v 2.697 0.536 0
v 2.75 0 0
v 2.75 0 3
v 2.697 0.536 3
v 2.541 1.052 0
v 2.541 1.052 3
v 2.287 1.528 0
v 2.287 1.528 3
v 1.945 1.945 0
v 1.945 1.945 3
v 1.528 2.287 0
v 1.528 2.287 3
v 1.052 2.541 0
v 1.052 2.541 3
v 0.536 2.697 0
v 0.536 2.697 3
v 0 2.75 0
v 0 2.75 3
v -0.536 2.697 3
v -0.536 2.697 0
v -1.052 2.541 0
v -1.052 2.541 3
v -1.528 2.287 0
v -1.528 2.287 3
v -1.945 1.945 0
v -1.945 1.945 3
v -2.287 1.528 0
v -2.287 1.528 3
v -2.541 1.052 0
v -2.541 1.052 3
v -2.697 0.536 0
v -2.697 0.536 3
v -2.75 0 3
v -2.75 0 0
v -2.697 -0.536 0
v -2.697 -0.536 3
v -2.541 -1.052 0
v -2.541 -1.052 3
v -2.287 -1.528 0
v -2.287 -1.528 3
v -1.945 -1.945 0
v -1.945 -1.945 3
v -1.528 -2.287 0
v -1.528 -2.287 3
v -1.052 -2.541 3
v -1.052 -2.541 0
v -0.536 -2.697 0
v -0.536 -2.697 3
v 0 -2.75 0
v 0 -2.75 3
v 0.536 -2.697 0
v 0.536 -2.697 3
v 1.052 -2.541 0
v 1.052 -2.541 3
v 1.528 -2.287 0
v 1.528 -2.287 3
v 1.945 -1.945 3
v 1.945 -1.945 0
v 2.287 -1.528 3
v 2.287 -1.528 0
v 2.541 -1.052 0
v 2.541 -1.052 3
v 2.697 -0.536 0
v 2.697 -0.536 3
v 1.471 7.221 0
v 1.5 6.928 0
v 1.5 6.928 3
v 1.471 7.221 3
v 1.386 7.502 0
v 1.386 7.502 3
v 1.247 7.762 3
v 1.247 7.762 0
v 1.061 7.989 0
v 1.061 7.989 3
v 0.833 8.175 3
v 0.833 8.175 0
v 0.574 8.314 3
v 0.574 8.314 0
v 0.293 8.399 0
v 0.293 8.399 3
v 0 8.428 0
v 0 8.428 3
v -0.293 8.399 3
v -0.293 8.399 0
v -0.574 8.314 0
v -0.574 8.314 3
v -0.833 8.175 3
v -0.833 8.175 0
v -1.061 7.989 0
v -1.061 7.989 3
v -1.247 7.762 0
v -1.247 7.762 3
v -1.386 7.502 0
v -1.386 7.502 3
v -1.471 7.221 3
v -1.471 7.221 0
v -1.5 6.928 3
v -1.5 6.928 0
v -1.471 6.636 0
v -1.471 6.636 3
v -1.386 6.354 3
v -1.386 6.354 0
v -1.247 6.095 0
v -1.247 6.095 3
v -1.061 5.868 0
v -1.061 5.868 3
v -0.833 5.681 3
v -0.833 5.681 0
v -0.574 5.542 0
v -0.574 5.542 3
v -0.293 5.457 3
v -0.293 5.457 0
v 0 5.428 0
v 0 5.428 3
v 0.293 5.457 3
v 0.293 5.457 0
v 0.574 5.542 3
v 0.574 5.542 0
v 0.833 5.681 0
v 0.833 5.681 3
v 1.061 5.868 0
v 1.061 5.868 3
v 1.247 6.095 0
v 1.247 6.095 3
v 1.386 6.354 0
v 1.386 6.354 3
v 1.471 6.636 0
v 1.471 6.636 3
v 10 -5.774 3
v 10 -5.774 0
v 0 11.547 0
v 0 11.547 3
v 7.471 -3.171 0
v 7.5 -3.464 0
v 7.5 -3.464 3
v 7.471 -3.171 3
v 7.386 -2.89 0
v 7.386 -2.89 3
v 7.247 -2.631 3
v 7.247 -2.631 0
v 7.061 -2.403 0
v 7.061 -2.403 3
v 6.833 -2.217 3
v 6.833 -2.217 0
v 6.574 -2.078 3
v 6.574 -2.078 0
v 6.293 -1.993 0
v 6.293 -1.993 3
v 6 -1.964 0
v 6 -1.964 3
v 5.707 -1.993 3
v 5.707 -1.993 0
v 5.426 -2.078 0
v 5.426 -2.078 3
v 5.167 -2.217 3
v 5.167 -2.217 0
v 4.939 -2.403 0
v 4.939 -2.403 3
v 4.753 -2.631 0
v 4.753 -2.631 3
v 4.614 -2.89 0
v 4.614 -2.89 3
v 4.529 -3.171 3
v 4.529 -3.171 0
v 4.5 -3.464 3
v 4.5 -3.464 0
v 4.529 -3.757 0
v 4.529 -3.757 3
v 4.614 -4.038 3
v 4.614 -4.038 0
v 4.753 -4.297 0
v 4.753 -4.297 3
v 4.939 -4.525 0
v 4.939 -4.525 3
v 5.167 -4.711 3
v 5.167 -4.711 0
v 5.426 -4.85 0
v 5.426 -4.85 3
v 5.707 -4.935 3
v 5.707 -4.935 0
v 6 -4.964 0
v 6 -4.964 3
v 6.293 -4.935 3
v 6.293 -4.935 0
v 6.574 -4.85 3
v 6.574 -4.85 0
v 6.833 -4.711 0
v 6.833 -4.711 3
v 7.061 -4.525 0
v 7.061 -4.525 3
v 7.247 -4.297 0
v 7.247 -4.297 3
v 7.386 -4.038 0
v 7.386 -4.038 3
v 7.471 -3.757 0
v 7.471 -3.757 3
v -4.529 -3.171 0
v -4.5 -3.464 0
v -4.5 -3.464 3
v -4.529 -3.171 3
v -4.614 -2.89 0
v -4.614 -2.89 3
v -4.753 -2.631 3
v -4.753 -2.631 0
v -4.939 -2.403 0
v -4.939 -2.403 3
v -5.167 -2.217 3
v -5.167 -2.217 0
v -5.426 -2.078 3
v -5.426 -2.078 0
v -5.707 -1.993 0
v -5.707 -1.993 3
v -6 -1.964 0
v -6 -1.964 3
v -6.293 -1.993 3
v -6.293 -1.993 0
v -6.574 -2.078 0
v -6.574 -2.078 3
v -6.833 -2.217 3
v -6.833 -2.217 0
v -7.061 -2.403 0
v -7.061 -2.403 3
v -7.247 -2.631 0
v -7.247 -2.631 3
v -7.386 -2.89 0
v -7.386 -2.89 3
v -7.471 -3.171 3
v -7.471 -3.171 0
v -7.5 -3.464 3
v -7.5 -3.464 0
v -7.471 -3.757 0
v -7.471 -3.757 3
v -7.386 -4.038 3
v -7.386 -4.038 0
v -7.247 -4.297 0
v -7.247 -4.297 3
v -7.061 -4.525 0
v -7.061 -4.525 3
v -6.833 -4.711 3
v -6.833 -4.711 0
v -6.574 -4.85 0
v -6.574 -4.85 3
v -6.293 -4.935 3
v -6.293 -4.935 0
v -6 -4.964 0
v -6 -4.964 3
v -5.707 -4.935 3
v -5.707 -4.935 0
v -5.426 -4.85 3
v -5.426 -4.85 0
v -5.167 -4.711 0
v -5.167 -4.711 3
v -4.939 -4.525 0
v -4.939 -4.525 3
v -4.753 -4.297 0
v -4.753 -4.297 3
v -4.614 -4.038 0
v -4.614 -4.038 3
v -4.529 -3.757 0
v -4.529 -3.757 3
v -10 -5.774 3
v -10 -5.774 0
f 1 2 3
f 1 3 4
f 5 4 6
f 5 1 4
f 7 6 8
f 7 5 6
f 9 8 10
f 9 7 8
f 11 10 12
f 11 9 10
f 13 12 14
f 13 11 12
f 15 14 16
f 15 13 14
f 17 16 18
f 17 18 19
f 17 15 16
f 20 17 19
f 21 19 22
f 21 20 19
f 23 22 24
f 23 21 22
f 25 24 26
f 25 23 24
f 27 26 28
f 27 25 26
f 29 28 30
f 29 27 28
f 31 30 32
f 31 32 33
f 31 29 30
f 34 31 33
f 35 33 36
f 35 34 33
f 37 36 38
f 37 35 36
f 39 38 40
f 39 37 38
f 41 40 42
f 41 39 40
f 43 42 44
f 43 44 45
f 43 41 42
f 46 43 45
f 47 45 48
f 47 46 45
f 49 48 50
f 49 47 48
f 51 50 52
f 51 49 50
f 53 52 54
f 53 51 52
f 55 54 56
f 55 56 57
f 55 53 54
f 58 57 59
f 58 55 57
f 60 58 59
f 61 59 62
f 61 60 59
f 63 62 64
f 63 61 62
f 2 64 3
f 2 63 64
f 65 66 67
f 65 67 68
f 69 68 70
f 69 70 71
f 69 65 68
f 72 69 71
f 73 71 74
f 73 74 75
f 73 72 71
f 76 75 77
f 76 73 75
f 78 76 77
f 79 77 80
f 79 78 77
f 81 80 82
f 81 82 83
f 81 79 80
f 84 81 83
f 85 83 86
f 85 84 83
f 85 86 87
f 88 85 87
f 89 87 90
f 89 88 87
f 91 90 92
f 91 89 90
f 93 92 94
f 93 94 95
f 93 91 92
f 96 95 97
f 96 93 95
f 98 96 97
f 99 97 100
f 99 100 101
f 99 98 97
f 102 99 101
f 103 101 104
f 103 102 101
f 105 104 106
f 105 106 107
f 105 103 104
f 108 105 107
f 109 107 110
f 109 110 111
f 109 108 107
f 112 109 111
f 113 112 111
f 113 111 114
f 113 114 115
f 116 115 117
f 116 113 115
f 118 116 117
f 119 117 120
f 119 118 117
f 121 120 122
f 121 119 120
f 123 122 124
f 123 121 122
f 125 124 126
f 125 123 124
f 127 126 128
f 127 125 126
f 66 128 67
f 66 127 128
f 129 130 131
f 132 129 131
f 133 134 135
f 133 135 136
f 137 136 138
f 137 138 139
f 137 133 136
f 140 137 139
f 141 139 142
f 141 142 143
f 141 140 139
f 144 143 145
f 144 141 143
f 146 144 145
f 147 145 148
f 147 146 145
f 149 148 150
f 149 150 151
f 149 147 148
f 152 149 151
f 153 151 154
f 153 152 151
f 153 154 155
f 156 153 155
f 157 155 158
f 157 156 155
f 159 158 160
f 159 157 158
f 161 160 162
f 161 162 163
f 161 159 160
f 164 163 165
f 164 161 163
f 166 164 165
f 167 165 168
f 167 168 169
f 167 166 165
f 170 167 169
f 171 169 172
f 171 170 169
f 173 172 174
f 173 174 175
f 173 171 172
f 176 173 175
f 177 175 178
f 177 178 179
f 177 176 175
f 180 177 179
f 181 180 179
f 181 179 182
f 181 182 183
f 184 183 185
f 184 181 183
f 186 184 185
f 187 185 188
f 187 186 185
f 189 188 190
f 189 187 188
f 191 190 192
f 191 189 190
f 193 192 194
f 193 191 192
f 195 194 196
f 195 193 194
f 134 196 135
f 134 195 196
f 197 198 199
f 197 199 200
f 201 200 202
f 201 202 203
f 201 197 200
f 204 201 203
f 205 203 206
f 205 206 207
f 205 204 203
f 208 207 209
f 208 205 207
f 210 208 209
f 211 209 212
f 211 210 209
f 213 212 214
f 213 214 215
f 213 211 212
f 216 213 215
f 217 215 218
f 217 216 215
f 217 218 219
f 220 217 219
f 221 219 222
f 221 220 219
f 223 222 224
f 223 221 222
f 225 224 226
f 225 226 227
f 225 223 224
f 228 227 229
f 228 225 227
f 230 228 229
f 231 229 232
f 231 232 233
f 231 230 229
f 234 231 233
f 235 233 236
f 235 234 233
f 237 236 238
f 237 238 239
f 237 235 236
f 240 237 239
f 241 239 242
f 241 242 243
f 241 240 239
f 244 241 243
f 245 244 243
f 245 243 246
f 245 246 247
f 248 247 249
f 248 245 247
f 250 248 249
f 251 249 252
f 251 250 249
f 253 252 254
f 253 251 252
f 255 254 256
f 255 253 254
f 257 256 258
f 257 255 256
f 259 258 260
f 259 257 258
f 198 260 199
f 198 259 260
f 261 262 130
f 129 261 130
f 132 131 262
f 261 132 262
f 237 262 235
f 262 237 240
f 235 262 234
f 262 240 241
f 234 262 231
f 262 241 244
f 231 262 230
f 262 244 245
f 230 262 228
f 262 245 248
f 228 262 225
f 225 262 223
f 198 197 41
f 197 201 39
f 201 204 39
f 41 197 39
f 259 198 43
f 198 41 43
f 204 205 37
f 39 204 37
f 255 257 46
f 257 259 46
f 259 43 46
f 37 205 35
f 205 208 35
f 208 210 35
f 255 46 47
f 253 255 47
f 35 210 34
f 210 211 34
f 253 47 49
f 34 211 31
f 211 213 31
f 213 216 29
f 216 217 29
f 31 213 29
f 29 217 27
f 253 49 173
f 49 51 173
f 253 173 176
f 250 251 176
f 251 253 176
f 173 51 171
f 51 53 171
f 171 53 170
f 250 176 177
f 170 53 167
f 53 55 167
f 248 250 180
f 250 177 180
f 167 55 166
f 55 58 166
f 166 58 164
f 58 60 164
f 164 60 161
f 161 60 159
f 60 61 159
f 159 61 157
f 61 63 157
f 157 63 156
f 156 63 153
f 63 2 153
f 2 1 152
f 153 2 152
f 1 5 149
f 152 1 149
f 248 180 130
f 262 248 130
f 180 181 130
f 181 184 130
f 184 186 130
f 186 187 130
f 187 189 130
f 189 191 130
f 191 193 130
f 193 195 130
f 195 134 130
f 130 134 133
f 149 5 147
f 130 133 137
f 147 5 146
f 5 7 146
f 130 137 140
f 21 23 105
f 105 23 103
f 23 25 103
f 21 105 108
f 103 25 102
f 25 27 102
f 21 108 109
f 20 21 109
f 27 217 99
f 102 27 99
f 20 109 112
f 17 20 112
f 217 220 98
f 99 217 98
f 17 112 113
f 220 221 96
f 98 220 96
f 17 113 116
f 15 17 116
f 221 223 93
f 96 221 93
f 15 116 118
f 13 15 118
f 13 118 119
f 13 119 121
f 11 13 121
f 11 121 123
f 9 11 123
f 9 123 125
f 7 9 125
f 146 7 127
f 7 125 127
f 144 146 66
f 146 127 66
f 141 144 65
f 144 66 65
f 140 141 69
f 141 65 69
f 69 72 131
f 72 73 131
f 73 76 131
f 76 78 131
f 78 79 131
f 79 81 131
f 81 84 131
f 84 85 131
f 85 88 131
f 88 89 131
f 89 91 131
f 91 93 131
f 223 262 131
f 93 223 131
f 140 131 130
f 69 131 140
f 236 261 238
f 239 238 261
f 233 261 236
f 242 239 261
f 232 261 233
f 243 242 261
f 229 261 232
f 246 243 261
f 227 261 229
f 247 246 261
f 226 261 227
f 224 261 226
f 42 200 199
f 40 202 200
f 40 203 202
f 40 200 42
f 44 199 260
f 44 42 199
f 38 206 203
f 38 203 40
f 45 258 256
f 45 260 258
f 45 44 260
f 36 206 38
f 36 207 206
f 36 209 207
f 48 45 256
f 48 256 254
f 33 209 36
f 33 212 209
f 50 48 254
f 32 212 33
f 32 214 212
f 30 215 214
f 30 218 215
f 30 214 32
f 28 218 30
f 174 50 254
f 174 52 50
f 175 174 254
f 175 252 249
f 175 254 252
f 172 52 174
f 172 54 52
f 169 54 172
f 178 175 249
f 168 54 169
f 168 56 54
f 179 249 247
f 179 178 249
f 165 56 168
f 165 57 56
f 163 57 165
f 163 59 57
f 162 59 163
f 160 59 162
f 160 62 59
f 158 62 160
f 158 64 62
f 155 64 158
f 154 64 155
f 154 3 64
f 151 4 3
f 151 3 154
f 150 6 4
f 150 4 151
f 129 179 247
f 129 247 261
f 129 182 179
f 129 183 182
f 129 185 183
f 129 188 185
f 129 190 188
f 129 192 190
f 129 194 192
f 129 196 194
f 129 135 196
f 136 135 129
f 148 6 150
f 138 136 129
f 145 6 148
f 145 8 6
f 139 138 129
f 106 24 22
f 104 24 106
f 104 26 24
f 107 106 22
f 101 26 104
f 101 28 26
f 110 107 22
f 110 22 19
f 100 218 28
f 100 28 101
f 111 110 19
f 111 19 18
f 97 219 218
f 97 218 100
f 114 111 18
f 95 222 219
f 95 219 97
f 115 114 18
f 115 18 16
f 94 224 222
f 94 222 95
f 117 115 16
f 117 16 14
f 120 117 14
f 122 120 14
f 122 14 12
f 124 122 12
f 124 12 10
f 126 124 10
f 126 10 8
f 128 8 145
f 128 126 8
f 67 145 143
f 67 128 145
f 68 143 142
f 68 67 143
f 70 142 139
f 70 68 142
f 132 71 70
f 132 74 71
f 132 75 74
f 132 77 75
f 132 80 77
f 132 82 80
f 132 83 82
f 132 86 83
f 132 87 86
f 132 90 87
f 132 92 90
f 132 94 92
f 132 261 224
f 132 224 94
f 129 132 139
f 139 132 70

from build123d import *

# Parameters (mm, degrees)
SKETCH_1_R      = 1.5
SKETCH_1_R_2    = 2.75
EXTRUDE_1_DEPTH = 3


with BuildPart() as part:
    # 草图1 → 凸台-拉伸1 (new body)
    with BuildSketch(Plane.XY):
        Polygon((0, 11.547005384), (-10, -5.773502692), (10, -5.773502692), align=None)
        with Locations((0, 6.92820323)):
            Circle(SKETCH_1_R, mode=Mode.SUBTRACT)
        with Locations((-6, -3.464101615)):
            Circle(SKETCH_1_R, mode=Mode.SUBTRACT)
        with Locations((6, -3.464101615)):
            Circle(SKETCH_1_R, mode=Mode.SUBTRACT)
        Circle(SKETCH_1_R_2, mode=Mode.SUBTRACT)
    extrude(amount=EXTRUDE_1_DEPTH)


solid = part.part
